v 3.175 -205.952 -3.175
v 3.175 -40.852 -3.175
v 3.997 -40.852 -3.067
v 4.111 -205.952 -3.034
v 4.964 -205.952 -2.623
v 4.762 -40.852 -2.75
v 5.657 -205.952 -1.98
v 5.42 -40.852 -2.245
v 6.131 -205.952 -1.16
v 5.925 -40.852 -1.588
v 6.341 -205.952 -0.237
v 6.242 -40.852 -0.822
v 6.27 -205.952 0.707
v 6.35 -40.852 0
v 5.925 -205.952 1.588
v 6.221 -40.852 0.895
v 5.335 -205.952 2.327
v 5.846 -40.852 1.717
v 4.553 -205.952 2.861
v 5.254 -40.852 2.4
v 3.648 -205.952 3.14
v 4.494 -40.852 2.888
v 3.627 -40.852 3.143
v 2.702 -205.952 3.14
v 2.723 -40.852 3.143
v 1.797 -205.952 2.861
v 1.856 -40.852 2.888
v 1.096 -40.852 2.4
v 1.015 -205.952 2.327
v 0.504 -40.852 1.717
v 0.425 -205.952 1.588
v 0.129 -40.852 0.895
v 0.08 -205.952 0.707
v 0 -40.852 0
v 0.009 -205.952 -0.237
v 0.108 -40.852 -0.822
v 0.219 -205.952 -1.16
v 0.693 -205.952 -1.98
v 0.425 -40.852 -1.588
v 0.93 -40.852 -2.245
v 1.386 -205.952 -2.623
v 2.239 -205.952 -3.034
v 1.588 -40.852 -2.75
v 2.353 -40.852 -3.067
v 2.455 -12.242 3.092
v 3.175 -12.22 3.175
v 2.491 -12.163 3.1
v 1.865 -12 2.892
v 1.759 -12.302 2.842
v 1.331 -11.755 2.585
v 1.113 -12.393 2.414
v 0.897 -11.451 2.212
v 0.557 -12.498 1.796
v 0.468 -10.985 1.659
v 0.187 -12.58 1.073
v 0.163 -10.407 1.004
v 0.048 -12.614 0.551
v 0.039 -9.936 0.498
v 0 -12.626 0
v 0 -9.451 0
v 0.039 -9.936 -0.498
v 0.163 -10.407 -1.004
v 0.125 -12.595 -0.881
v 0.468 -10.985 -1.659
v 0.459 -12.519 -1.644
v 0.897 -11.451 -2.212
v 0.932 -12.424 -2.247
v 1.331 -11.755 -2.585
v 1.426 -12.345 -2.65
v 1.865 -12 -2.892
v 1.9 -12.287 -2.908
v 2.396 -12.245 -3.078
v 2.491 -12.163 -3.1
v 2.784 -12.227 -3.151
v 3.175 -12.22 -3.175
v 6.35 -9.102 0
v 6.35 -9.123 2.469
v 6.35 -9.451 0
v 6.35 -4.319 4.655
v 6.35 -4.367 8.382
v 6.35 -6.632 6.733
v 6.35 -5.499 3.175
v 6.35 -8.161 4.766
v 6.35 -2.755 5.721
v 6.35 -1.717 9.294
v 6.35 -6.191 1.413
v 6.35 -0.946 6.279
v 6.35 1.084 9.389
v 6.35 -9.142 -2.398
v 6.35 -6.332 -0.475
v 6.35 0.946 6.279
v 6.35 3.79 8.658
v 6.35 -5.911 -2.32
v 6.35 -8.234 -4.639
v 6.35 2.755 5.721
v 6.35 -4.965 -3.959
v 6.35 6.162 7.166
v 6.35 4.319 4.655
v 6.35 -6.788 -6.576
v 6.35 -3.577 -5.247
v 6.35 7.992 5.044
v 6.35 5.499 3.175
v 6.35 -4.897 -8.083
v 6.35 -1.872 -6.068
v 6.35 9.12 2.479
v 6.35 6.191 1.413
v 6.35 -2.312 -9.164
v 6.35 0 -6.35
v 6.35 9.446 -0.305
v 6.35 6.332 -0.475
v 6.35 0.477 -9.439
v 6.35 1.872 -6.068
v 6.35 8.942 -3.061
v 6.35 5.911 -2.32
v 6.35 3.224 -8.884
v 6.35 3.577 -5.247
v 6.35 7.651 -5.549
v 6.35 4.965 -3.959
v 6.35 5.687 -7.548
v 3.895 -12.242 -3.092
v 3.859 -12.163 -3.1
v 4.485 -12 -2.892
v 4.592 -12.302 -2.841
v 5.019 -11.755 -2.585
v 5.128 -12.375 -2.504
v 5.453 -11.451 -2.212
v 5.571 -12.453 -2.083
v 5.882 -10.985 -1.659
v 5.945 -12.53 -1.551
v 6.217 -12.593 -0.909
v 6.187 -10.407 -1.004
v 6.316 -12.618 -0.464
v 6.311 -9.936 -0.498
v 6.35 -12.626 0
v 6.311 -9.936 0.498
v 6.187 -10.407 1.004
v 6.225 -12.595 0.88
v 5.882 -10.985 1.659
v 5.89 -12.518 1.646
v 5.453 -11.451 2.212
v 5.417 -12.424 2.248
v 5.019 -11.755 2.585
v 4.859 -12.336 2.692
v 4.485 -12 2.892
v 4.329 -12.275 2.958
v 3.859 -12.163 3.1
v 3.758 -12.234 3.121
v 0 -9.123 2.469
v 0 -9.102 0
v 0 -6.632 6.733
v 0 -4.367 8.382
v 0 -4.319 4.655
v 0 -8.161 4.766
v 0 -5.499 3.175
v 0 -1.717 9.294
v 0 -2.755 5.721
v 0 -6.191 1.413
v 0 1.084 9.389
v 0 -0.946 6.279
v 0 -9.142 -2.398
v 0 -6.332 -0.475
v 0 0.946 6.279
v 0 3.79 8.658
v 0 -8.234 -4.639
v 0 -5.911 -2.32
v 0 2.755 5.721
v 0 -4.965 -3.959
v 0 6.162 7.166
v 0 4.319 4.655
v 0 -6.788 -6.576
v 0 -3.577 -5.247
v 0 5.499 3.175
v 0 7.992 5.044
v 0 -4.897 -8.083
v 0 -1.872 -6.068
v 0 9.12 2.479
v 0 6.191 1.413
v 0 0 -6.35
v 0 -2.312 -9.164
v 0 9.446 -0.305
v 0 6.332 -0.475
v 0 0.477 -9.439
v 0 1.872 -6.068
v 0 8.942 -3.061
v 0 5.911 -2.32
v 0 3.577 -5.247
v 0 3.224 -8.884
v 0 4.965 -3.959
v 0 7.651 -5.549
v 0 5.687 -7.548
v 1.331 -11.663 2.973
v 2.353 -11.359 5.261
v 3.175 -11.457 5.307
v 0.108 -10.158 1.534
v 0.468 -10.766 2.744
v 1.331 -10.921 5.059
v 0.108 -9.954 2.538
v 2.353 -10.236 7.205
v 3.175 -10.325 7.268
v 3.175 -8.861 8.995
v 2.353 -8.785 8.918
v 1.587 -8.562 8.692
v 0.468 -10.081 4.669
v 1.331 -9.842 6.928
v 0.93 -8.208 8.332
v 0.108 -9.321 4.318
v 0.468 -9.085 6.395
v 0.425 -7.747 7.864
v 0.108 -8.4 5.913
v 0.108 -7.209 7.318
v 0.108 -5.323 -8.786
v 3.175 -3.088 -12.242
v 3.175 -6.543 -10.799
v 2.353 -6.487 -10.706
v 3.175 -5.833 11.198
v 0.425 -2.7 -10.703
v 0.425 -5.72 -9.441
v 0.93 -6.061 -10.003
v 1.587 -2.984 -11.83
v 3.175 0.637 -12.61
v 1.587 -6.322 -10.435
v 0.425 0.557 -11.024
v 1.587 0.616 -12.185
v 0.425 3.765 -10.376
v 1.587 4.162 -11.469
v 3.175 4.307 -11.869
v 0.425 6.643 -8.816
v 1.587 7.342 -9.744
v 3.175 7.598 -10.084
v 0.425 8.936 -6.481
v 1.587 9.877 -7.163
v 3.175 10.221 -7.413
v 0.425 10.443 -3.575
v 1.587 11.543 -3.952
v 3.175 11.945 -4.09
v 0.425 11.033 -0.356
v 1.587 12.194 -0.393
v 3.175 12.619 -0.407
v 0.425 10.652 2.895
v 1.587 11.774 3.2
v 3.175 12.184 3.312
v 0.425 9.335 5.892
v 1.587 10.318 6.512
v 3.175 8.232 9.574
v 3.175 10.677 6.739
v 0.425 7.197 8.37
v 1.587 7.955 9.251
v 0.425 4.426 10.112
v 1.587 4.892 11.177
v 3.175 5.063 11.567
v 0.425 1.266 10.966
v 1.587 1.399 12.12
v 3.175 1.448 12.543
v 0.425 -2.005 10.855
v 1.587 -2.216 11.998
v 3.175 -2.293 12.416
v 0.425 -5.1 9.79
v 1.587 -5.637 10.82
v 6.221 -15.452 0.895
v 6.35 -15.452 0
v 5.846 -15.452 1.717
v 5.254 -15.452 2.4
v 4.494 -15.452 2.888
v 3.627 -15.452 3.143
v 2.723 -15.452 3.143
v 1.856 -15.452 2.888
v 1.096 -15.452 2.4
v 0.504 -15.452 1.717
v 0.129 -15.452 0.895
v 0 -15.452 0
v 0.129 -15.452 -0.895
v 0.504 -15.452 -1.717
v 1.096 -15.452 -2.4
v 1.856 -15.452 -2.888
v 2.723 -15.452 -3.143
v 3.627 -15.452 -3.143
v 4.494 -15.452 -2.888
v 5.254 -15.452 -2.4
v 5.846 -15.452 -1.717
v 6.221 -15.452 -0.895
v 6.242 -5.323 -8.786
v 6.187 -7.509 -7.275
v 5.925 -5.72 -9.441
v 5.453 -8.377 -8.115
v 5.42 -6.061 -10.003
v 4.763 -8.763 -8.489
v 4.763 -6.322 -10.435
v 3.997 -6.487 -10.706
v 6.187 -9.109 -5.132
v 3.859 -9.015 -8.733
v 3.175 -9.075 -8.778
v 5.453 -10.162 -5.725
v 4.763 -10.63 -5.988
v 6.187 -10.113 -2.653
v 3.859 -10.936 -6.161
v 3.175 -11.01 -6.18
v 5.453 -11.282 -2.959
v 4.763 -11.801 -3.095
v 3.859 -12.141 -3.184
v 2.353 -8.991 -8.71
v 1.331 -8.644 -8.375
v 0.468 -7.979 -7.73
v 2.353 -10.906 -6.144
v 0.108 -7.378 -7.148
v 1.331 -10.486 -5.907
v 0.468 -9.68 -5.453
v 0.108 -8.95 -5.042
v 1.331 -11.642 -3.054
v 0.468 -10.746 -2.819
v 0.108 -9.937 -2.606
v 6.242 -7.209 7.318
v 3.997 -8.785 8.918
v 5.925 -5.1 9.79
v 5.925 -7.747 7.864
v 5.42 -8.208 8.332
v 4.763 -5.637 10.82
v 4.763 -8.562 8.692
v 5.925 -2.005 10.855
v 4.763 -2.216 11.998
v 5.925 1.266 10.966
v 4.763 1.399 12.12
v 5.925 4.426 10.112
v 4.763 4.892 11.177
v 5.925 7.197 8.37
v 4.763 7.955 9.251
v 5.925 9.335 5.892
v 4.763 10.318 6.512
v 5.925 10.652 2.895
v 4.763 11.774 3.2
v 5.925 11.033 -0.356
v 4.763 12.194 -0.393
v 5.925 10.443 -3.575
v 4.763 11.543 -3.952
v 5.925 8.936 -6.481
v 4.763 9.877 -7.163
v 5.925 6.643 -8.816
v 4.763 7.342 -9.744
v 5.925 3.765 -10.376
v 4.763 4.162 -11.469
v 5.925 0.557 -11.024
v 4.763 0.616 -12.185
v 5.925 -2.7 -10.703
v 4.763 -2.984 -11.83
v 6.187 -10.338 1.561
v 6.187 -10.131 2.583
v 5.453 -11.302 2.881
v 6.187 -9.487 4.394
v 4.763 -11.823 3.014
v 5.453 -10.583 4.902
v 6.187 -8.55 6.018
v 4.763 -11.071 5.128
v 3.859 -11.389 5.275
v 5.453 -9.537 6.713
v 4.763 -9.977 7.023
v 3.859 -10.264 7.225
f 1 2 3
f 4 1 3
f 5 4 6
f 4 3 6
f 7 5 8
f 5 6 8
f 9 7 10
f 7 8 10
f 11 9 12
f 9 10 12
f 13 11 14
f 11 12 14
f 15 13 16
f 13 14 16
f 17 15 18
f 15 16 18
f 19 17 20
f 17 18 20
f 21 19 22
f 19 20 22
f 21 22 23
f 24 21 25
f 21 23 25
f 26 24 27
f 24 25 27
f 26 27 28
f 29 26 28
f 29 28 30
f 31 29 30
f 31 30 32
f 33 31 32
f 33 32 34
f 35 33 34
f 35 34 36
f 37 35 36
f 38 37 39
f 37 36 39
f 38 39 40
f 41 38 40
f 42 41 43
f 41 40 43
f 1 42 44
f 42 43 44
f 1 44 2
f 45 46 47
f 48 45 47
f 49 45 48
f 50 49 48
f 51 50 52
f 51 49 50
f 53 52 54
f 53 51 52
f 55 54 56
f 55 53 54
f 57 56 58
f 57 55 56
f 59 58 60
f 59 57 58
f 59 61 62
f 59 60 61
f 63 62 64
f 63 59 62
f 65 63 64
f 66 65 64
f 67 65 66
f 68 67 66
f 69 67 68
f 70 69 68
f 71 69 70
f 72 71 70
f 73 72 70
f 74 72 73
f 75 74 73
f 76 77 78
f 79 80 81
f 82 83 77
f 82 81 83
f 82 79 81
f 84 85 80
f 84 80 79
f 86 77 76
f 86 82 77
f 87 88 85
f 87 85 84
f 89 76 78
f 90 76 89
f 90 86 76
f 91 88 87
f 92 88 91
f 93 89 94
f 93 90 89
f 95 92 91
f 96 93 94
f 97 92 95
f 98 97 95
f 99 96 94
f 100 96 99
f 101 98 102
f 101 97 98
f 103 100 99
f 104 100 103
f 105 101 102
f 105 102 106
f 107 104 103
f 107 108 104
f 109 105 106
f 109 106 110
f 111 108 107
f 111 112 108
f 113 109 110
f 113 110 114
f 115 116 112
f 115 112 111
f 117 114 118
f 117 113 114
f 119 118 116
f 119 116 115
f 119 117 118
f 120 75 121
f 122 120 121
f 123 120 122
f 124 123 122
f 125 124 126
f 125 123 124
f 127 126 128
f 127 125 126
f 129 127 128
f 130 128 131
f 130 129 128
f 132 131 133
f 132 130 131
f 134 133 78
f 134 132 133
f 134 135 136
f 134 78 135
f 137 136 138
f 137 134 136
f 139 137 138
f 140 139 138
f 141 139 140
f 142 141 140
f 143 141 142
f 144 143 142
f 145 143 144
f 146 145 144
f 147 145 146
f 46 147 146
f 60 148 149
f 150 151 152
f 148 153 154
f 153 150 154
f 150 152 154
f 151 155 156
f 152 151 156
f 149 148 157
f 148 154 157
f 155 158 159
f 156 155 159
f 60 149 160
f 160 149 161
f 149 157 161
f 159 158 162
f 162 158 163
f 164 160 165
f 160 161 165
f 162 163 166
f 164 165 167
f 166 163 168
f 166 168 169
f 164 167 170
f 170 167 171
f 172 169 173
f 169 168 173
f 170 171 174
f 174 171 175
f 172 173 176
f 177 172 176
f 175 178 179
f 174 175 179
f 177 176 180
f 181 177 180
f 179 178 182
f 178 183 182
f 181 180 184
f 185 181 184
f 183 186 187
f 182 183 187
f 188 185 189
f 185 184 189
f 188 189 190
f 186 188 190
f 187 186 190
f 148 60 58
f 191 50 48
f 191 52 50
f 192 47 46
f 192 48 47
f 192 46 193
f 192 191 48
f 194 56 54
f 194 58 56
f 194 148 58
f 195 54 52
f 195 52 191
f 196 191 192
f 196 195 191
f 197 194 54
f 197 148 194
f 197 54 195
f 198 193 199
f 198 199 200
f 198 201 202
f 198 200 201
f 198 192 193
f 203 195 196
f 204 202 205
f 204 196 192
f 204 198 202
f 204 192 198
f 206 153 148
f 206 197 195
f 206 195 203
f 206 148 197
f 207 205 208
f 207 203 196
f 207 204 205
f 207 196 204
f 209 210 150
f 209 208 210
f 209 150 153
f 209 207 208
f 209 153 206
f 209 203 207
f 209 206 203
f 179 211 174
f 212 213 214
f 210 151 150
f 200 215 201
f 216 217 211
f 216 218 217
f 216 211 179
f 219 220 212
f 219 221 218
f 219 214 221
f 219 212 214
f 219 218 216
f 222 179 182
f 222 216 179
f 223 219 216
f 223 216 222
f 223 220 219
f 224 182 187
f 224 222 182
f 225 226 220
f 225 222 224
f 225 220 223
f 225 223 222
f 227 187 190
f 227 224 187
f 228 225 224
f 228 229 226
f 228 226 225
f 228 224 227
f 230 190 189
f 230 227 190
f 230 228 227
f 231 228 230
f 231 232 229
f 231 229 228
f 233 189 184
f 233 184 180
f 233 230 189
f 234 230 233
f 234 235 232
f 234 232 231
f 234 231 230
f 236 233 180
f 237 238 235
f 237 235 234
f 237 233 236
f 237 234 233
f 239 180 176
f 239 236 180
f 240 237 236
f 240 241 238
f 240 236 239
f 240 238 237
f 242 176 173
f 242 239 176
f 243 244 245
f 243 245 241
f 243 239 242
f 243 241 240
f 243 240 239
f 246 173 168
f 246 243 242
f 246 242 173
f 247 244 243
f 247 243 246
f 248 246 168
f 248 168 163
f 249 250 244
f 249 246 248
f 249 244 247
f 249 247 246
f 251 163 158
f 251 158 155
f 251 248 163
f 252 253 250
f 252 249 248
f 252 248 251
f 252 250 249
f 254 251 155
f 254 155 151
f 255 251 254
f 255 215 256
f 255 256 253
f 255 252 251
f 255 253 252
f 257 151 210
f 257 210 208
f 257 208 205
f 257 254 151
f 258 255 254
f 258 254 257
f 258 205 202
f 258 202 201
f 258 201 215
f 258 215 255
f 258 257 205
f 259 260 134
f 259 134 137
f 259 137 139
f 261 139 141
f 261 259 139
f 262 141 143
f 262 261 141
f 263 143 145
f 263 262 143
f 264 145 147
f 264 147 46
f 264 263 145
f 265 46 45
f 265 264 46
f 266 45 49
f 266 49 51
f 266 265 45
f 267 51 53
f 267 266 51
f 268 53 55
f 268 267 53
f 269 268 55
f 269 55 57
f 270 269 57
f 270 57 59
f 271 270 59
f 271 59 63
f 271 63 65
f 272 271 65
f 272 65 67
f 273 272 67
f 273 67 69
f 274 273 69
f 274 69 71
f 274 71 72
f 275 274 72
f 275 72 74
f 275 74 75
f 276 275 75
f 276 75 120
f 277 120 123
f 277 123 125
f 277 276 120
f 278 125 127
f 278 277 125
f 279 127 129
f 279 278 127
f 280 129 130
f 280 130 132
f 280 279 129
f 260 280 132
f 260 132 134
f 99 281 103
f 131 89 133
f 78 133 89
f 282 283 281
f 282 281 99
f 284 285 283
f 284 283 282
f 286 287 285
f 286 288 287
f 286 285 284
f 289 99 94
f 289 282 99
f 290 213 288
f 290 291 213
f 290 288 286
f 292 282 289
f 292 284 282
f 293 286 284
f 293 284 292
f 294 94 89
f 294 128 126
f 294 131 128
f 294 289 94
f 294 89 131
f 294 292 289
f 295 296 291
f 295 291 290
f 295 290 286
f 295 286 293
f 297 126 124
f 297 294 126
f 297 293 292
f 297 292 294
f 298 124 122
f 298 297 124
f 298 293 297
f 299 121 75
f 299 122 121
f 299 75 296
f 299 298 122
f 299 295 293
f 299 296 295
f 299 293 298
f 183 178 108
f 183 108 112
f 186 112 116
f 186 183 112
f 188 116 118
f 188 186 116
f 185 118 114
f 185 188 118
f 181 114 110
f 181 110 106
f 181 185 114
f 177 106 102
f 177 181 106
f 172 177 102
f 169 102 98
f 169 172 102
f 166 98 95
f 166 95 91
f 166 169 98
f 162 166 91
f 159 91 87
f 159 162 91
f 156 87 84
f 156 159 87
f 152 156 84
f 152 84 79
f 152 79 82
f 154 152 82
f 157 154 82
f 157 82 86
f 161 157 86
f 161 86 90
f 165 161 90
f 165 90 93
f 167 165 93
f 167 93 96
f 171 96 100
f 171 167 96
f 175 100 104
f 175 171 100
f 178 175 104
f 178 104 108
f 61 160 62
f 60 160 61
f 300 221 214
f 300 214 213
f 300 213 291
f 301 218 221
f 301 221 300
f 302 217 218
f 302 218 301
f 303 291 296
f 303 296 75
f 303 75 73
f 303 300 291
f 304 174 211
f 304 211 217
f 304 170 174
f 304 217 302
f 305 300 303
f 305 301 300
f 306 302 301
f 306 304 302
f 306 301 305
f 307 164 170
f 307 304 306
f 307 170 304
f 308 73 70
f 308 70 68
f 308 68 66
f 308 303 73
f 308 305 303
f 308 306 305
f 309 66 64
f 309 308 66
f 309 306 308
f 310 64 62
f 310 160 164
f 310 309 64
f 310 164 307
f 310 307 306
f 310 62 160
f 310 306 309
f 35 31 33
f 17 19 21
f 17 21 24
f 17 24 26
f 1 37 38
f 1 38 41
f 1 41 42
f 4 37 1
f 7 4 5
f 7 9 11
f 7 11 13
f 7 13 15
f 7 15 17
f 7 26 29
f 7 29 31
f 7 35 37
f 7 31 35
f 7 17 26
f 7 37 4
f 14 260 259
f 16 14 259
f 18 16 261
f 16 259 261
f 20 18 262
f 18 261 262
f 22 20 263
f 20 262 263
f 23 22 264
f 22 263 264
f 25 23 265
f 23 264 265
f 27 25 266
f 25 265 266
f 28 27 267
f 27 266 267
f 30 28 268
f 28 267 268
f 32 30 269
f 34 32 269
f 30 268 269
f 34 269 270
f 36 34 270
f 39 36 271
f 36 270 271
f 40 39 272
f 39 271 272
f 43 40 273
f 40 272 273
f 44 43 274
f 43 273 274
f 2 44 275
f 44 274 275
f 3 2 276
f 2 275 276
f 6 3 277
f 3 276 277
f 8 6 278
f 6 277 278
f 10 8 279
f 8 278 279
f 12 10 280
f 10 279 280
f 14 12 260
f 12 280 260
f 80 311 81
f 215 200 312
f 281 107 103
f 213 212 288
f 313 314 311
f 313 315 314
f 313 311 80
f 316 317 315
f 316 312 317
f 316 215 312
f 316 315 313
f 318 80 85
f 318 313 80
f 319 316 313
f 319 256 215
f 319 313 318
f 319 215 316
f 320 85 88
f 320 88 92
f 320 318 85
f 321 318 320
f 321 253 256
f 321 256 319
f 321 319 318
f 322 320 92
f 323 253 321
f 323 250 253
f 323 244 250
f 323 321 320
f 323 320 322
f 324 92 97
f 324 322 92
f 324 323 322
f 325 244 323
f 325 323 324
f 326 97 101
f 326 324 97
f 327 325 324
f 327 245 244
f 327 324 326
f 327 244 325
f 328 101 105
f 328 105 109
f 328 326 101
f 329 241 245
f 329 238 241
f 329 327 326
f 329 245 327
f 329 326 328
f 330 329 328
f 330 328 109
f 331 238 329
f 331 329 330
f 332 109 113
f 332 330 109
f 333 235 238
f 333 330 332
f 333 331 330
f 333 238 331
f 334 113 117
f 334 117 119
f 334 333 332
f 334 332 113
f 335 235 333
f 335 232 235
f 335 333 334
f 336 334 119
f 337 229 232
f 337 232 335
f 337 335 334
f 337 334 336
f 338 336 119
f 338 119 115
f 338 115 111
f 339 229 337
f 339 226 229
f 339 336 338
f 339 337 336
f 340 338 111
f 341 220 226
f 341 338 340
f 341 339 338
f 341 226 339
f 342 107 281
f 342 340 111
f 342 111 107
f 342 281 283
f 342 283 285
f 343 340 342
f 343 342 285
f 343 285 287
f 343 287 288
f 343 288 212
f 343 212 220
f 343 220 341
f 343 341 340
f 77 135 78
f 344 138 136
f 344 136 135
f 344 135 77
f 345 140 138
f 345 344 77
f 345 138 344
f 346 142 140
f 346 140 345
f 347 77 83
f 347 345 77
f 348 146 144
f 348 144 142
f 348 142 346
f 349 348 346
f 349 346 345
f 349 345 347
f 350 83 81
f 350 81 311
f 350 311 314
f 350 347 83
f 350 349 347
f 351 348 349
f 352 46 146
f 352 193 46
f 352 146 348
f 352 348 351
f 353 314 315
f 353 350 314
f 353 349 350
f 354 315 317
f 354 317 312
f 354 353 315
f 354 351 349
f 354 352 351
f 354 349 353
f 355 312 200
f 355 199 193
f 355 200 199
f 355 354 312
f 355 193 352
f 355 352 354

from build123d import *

# Parameters (mm, degrees)
SKETCH1_R                = 12.626048476
SKETCH1_R_2              = 6.35
BOSS_EXTRUDE1_DEPTH      = 6.35
BOSS_EXTRUDE2_DEPTH      = 6.35
SKETCH4_R                = 3.175
BOSS_EXTRUDE3_DEPTH      = 50.8
CUT_EXTRUDE1_START       = -6.35
CUT_EXTRUDE1_DEPTH       = 6.35
SKETCH7_R                = 3.175
BOSS_EXTRUDE4_DEPTH      = 57.15
SKETCH7_2_R              = 3.175
CUT_EXTRUDE2_DEPTH       = 25.4
FILLET1_R                = 3.175
BOSS_EXTRUDE5_DEPTH      = 139.7
BOSS_EXTRUDE5_DEPTH_BACK = 25.4
SKETCH7_3_R              = 3.175


with BuildPart() as part:
    # Sketch1 → Boss-Extrude1 (new body)
    with BuildSketch(Plane(origin=(0, 0, 0), x_dir=(0, 0, -1), z_dir=(1, 0, 0))):
        Circle(SKETCH1_R)
        Circle(SKETCH1_R_2, mode=Mode.SUBTRACT)
    extrude(amount=BOSS_EXTRUDE1_DEPTH)

    # Sketch3 → Boss-Extrude2 (add)
    with BuildSketch(Plane(origin=(6.35, 0, 0), x_dir=(0, 0, -1), z_dir=(1, 0, 0))):
        Polygon((-8.994798287, -8.860626609), (-8.994798287, -15.452306957), (10.798615768, -15.452306957), (10.798615768, -6.542705681), (-8.994798287, -6.542705681), align=None)
    extrude(amount=-BOSS_EXTRUDE2_DEPTH)

    # Sketch4 → Boss-Extrude3 (add)
    with BuildSketch(Plane.XZ.offset(15.452306957)):
        with Locations(Location((3.175, 0, 0), (0, 0, 180))):
            Circle(SKETCH4_R)
    extrude(amount=BOSS_EXTRUDE3_DEPTH)

    # Sketch5 → Cut-Extrude1 (cut)
    with BuildSketch(Plane(origin=(6.35, 0, 0), x_dir=(0, 0, -1), z_dir=(1, 0, 0)).offset(CUT_EXTRUDE1_START)):
        with BuildLine():
            Line((-8.994798287, -8.860626609), (-8.994798287, -15.452306957))
            Line((-8.994798287, -15.452306957), (10.798615768, -15.452306957))
            Line((10.798615768, -15.452306957), (10.798615768, -6.542705681))
            ThreePointArc((10.798615768, -6.542705681), (1.46854647, -12.540353719), (-8.994798287, -8.860626609))
        make_face()
    extrude(amount=CUT_EXTRUDE1_DEPTH, mode=Mode.SUBTRACT)


with BuildPart() as cut_extrude1_piece_1:
    # of the separate pieces the step leaves, piece 1, a body of its own (cut_extrude1_pieces)
    add(part.part.solids().sort_by_distance((0, -6.542705681, -10.798615768))[0])



with BuildPart() as cut_extrude1_piece_2:
    # of the separate pieces the step leaves, piece 2, a body of its own (cut_extrude1_pieces)
    add(part.part.solids().sort_by_distance((0, -15.452306957, 0))[0])


with BuildPart() as cut_extrude1_piece_1_1:
    add(cut_extrude1_piece_1.part)

    add(cut_extrude1_piece_2.part)  # Boss-Extrude4 merges Cut-Extrude1 piece 2
    # Sketch7 → Boss-Extrude4 (add)
    with BuildSketch(Plane.XZ.offset(66.252306957)):
        with Locations((3.175, 0)):
            Circle(SKETCH7_R)
    extrude(amount=-BOSS_EXTRUDE4_DEPTH)

    # Sketch7<2> → Cut-Extrude2 (cut)
    with BuildSketch(Plane.XZ.offset(66.252306957)):
        with Locations((3.175, 0)):
            Circle(SKETCH7_2_R)
    extrude(amount=-CUT_EXTRUDE2_DEPTH, mode=Mode.SUBTRACT)

    # Fillet1
    # the kernel refuses this fillet: 3.175 mm, written as the material it takes off along each edge
    with BuildSketch(Plane(origin=(6.35, 0, 0), x_dir=(0, -0.7017735299957855, 0.7124001071008161), z_dir=(0, -0.7124001071008161, -0.7017735299957855))) as fillet1_piece_1:
        with BuildLine():
            CenterArc((12.626048476 - FILLET1_R, FILLET1_R), FILLET1_R, 270, 90)
            Line((12.626048476 - FILLET1_R, 0), (12.626048476, 0))
            Line((12.626048476, 0), (12.626048476, FILLET1_R))
        make_face()
    revolve(axis=Axis((6.35, 0, 0), (-1, 0, 0)), revolution_arc=255.78045899, mode=Mode.SUBTRACT)
    with BuildSketch(Plane(origin=(0, 0, 0), x_dir=(0, -0.5181910787843432, -0.855264874684047), z_dir=(0, -0.855264874684047, 0.5181910787843432))) as fillet1_piece_2:
        with BuildLine():
            CenterArc((12.626048476 - FILLET1_R, FILLET1_R), FILLET1_R, 270, 90)
            Line((12.626048476 - FILLET1_R, 0), (12.626048476, 0))
            Line((12.626048476, 0), (12.626048476, FILLET1_R))
        make_face()
    revolve(axis=Axis((0, 0, 0), (1, 0, 0)), revolution_arc=255.78045899, mode=Mode.SUBTRACT)
    with BuildSketch(Plane(origin=(0, 0, 0), x_dir=(0, -0.5181910787843435, -0.8552648746840469), z_dir=(0, 0.8552648746840469, -0.5181910787843435))) as fillet1_piece_3_section:
        with BuildLine():
            CenterArc((12.626048476 - FILLET1_R, -FILLET1_R), FILLET1_R, 0, 90)
            Line((12.626048476 - FILLET1_R, 0), (12.626048476, 0))
            Line((12.626048476, 0), (12.626048476, -FILLET1_R))
        make_face()
    fillet1_piece_3 = revolve(axis=Axis((0, 0, 0), (-1, 0, 0)), revolution_arc=58.789009325, mode=Mode.PRIVATE)
    fillet1_piece_3 = fillet1_piece_3 - Plane(origin=(3.175, -9.611252213, 0), x_dir=(1, 0, 0), z_dir=(0, -1, 0)) * Cylinder(3.175, 51, mode=Mode.PRIVATE)
    add(fillet1_piece_3, mode=Mode.SUBTRACT)
    with BuildSketch(Plane(origin=(0, 0, 0), x_dir=(0, -1, 0), z_dir=(0, 0, -1))) as fillet1_piece_4_section:
        with BuildLine():
            CenterArc((12.626048476 - FILLET1_R, -FILLET1_R), FILLET1_R, 0, 90)
            Line((12.626048476 - FILLET1_R, 0), (12.626048476, 0))
            Line((12.626048476, 0), (12.626048476, -FILLET1_R))
        make_face()
    fillet1_piece_4 = revolve(axis=Axis((0, 0, 0), (-1, 0, 0)), revolution_arc=45.430531685, mode=Mode.PRIVATE)
    fillet1_piece_4 = fillet1_piece_4 - Plane(origin=(3.175, -10.439695548, 0), x_dir=(1, 0, 0), z_dir=(0, -1, 0)) * Cylinder(3.175, 51, mode=Mode.PRIVATE)
    add(fillet1_piece_4, mode=Mode.SUBTRACT)
    with BuildSketch(Plane(origin=(6.35, 0, 0), x_dir=(0, -1, 0), z_dir=(0, 0, -1))) as fillet1_piece_5_section:
        with BuildLine():
            CenterArc((12.626048476 - FILLET1_R, FILLET1_R), FILLET1_R, 270, 90)
            Line((12.626048476 - FILLET1_R, 0), (12.626048476, 0))
            Line((12.626048476, 0), (12.626048476, FILLET1_R))
        make_face()
    fillet1_piece_5 = revolve(axis=Axis((6.35, 0, 0), (-1, 0, 0)), revolution_arc=45.430531685, mode=Mode.PRIVATE)
    fillet1_piece_5 = fillet1_piece_5 - Plane(origin=(3.175, -10.439696502, 0), x_dir=(1, 0, 0), z_dir=(0, -1, 0)) * Cylinder(3.175, 51, mode=Mode.PRIVATE)
    add(fillet1_piece_5, mode=Mode.SUBTRACT)
    with BuildSketch(Plane(origin=(6.35, 0, 0), x_dir=(0, -0.5181910787843435, -0.8552648746840469), z_dir=(0, 0.8552648746840469, -0.5181910787843435))) as fillet1_piece_6_section:
        with BuildLine():
            CenterArc((12.626048476 - FILLET1_R, FILLET1_R), FILLET1_R, 270, 90)
            Line((12.626048476 - FILLET1_R, 0), (12.626048476, 0))
            Line((12.626048476, 0), (12.626048476, FILLET1_R))
        make_face()
    fillet1_piece_6 = revolve(axis=Axis((6.35, 0, 0), (-1, 0, 0)), revolution_arc=58.789009325, mode=Mode.PRIVATE)
    fillet1_piece_6 = fillet1_piece_6 - Plane(origin=(3.175, -9.611252422, 0), x_dir=(1, 0, 0), z_dir=(0, -1, 0)) * Cylinder(3.175, 51, mode=Mode.PRIVATE)
    add(fillet1_piece_6, mode=Mode.SUBTRACT)

    # Sketch7<3> → Boss-Extrude5 (add, two sides: drawn at the far end of the back side and taken through both)
    with BuildSketch(Plane.XZ.offset(66.252306957).offset(-BOSS_EXTRUDE5_DEPTH_BACK)):
        with Locations(Location((3.175, 0, 0), (0, 0, 270))):
            Circle(SKETCH7_3_R)
    extrude(amount=BOSS_EXTRUDE5_DEPTH + BOSS_EXTRUDE5_DEPTH_BACK)


solid = cut_extrude1_piece_1_1.part
